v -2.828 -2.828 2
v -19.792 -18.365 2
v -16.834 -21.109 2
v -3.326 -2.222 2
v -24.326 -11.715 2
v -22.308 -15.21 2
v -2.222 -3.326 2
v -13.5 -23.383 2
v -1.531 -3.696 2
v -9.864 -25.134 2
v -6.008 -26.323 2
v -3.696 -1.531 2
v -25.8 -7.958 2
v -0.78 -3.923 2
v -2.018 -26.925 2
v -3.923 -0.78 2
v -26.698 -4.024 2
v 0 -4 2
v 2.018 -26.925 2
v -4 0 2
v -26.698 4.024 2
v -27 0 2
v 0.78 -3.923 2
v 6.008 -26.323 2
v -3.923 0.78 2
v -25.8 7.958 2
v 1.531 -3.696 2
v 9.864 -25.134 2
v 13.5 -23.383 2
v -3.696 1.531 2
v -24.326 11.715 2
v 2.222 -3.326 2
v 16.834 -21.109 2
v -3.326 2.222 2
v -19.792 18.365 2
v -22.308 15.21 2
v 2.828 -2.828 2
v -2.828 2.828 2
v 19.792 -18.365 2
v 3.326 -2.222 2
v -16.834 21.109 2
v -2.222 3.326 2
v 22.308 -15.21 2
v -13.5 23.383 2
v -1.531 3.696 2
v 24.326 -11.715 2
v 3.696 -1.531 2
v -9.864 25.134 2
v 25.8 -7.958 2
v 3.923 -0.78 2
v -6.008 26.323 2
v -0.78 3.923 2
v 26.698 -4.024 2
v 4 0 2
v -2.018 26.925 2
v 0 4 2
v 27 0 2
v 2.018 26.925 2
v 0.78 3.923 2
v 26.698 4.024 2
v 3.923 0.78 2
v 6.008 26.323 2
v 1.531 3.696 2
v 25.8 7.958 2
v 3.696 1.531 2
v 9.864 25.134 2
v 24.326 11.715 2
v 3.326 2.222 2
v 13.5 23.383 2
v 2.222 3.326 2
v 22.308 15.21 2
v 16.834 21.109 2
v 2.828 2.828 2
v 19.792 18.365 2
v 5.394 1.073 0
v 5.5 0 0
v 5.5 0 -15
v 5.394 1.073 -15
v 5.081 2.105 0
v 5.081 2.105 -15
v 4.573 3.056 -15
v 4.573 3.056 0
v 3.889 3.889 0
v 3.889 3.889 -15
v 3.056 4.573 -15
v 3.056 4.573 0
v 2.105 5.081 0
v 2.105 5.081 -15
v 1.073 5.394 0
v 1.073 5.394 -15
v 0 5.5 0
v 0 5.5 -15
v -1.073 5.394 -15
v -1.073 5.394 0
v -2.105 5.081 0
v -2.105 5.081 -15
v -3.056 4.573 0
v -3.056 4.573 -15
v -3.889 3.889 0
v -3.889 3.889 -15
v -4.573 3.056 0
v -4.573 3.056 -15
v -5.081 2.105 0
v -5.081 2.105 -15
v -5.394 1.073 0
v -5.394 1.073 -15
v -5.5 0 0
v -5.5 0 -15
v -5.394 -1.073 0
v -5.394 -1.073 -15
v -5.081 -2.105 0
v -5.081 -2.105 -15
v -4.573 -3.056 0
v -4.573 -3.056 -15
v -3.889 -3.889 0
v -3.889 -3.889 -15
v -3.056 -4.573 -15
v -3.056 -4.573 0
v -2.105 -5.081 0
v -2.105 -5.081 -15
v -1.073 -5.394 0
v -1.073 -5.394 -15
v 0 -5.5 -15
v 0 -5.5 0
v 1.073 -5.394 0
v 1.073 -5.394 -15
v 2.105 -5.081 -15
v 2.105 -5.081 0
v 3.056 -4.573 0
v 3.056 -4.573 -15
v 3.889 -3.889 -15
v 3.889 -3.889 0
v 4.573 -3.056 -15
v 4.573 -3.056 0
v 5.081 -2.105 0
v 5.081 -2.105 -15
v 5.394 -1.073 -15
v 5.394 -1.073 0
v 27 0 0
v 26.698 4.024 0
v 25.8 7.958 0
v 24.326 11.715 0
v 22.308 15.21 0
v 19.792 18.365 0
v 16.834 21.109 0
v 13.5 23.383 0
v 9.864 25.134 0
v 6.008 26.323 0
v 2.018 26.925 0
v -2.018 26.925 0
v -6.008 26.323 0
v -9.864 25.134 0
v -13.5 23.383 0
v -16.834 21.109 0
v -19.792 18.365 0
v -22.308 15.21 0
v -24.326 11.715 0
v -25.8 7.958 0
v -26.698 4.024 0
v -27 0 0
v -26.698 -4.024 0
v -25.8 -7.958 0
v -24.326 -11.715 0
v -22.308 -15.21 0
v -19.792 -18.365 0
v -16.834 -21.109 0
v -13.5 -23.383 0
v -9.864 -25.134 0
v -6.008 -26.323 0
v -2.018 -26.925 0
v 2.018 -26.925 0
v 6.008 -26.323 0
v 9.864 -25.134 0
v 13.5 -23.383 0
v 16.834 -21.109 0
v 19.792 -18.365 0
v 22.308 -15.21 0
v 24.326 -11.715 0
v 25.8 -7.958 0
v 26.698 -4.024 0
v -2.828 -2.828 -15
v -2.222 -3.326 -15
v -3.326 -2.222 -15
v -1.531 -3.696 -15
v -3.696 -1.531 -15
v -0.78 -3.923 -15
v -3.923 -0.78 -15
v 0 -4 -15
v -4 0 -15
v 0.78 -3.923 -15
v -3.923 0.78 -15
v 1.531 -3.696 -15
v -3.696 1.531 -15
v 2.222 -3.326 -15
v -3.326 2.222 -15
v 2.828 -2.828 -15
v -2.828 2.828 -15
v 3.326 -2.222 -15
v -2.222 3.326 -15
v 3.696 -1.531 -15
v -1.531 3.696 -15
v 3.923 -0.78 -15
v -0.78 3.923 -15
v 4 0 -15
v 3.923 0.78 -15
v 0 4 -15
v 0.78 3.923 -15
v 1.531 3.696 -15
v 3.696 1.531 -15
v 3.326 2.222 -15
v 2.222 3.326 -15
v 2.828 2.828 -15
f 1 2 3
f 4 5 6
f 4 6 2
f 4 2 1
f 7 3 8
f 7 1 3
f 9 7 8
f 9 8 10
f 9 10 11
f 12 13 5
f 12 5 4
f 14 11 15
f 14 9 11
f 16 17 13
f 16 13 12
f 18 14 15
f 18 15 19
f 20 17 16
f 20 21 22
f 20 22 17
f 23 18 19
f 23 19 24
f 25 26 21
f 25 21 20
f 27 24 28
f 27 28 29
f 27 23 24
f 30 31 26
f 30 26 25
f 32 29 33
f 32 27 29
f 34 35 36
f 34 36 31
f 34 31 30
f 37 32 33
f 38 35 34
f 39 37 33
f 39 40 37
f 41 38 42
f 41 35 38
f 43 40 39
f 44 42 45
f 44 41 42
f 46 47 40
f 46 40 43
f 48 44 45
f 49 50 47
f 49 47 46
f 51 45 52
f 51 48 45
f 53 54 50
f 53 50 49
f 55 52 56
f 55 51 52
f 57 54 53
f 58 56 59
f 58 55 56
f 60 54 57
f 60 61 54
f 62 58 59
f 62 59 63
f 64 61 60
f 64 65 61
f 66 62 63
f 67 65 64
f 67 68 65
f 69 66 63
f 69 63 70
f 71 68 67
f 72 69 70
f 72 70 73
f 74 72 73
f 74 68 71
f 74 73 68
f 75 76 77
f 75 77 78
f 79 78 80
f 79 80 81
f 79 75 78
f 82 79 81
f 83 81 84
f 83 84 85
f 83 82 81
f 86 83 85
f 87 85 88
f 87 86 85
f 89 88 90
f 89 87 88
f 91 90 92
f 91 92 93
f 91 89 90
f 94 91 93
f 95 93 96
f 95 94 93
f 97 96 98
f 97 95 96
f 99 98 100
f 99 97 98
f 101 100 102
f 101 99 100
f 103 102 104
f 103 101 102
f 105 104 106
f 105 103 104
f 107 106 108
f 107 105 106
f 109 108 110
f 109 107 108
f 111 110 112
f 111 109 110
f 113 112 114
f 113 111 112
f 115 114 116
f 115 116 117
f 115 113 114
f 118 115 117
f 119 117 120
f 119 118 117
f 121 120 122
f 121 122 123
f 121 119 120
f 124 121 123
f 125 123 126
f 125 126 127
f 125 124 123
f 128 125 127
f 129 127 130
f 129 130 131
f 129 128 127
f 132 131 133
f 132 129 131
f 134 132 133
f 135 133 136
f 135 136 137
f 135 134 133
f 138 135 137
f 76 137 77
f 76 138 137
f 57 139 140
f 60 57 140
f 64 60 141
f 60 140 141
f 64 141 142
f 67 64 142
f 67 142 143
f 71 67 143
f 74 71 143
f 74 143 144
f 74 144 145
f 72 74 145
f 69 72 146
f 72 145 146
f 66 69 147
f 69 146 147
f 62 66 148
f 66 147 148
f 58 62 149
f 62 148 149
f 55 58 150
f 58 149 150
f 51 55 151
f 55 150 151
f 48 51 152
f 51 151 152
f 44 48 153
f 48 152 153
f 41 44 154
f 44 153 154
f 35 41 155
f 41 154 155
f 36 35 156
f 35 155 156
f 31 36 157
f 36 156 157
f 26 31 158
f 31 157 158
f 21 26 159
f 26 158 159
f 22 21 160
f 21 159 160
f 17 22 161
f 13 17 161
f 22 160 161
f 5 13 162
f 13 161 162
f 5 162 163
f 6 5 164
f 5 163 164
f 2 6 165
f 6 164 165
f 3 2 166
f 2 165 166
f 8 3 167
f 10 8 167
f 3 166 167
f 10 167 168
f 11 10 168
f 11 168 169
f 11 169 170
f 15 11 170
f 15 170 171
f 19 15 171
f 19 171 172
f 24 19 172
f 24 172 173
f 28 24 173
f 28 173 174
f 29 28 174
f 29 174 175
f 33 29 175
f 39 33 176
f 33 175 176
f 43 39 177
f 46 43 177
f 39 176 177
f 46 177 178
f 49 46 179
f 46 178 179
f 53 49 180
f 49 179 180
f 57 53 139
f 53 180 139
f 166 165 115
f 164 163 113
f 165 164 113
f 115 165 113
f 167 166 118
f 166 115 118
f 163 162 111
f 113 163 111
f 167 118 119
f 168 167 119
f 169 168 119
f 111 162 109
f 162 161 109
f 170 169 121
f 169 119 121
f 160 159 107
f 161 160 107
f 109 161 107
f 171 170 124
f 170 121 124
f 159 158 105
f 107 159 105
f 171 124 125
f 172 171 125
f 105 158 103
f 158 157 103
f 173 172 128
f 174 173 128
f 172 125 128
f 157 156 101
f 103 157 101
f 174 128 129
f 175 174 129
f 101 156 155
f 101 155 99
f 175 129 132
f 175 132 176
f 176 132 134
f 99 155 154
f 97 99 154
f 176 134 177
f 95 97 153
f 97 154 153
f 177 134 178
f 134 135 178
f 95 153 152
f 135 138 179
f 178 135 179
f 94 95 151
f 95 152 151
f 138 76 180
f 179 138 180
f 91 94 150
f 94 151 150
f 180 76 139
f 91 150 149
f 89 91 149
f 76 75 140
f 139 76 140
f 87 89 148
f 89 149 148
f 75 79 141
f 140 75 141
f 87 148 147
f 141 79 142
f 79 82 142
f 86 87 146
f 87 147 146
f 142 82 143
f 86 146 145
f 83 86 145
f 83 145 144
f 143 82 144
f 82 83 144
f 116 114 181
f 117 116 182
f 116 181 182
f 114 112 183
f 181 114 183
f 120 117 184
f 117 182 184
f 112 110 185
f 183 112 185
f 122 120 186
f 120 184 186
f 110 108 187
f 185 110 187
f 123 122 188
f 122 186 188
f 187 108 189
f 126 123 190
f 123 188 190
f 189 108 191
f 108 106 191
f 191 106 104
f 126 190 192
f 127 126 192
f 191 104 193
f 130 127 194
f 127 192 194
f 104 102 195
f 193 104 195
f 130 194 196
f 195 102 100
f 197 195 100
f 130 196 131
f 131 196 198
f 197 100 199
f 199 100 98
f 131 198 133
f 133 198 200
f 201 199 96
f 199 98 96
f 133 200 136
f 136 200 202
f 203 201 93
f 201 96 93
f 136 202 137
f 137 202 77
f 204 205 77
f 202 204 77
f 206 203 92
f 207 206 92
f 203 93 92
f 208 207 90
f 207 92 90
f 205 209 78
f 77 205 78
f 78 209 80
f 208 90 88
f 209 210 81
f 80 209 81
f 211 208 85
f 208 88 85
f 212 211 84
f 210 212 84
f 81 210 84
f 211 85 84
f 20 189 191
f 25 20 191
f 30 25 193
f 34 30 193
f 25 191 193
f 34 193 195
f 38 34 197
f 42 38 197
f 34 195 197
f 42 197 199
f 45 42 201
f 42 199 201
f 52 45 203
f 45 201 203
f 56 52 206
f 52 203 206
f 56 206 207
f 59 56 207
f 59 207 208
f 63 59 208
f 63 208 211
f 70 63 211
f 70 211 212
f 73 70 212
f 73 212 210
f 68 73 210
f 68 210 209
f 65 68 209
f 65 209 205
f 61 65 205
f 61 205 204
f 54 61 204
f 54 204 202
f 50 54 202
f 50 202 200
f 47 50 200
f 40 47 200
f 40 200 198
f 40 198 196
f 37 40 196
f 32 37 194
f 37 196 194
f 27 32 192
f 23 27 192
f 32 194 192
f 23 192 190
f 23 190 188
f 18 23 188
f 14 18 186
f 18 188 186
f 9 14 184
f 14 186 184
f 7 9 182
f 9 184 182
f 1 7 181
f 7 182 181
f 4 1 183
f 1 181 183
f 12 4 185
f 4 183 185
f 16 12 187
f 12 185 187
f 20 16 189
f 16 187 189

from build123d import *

# Parameters (mm, degrees)
SKETCH_1_R          = 27
EXTRUDE_1_DEPTH     = 2
SKETCH_2_R          = 5.5
EXTRUDE_2_DEPTH     = 15
SKETCH_3_R          = 4
CUT_EXTRUDE_1_DEPTH = 150


with BuildPart() as part:
    # 草图1 → 凸台-拉伸1 (new body)
    with BuildSketch(Plane.XY):
        Circle(SKETCH_1_R)
    extrude(amount=EXTRUDE_1_DEPTH)

    # 草图2 → 凸台-拉伸2 (add)
    with BuildSketch(Plane.XY):
        Circle(SKETCH_2_R)
    extrude(amount=-EXTRUDE_2_DEPTH)

    # 草图3 → 切除-拉伸1 (cut)
    with BuildSketch(Plane(origin=(0, 0, -15), x_dir=(-1, 0, 0), z_dir=(0, 0, -1))):
        Circle(SKETCH_3_R)
    extrude(amount=-CUT_EXTRUDE_1_DEPTH, mode=Mode.SUBTRACT)


solid = part.part
